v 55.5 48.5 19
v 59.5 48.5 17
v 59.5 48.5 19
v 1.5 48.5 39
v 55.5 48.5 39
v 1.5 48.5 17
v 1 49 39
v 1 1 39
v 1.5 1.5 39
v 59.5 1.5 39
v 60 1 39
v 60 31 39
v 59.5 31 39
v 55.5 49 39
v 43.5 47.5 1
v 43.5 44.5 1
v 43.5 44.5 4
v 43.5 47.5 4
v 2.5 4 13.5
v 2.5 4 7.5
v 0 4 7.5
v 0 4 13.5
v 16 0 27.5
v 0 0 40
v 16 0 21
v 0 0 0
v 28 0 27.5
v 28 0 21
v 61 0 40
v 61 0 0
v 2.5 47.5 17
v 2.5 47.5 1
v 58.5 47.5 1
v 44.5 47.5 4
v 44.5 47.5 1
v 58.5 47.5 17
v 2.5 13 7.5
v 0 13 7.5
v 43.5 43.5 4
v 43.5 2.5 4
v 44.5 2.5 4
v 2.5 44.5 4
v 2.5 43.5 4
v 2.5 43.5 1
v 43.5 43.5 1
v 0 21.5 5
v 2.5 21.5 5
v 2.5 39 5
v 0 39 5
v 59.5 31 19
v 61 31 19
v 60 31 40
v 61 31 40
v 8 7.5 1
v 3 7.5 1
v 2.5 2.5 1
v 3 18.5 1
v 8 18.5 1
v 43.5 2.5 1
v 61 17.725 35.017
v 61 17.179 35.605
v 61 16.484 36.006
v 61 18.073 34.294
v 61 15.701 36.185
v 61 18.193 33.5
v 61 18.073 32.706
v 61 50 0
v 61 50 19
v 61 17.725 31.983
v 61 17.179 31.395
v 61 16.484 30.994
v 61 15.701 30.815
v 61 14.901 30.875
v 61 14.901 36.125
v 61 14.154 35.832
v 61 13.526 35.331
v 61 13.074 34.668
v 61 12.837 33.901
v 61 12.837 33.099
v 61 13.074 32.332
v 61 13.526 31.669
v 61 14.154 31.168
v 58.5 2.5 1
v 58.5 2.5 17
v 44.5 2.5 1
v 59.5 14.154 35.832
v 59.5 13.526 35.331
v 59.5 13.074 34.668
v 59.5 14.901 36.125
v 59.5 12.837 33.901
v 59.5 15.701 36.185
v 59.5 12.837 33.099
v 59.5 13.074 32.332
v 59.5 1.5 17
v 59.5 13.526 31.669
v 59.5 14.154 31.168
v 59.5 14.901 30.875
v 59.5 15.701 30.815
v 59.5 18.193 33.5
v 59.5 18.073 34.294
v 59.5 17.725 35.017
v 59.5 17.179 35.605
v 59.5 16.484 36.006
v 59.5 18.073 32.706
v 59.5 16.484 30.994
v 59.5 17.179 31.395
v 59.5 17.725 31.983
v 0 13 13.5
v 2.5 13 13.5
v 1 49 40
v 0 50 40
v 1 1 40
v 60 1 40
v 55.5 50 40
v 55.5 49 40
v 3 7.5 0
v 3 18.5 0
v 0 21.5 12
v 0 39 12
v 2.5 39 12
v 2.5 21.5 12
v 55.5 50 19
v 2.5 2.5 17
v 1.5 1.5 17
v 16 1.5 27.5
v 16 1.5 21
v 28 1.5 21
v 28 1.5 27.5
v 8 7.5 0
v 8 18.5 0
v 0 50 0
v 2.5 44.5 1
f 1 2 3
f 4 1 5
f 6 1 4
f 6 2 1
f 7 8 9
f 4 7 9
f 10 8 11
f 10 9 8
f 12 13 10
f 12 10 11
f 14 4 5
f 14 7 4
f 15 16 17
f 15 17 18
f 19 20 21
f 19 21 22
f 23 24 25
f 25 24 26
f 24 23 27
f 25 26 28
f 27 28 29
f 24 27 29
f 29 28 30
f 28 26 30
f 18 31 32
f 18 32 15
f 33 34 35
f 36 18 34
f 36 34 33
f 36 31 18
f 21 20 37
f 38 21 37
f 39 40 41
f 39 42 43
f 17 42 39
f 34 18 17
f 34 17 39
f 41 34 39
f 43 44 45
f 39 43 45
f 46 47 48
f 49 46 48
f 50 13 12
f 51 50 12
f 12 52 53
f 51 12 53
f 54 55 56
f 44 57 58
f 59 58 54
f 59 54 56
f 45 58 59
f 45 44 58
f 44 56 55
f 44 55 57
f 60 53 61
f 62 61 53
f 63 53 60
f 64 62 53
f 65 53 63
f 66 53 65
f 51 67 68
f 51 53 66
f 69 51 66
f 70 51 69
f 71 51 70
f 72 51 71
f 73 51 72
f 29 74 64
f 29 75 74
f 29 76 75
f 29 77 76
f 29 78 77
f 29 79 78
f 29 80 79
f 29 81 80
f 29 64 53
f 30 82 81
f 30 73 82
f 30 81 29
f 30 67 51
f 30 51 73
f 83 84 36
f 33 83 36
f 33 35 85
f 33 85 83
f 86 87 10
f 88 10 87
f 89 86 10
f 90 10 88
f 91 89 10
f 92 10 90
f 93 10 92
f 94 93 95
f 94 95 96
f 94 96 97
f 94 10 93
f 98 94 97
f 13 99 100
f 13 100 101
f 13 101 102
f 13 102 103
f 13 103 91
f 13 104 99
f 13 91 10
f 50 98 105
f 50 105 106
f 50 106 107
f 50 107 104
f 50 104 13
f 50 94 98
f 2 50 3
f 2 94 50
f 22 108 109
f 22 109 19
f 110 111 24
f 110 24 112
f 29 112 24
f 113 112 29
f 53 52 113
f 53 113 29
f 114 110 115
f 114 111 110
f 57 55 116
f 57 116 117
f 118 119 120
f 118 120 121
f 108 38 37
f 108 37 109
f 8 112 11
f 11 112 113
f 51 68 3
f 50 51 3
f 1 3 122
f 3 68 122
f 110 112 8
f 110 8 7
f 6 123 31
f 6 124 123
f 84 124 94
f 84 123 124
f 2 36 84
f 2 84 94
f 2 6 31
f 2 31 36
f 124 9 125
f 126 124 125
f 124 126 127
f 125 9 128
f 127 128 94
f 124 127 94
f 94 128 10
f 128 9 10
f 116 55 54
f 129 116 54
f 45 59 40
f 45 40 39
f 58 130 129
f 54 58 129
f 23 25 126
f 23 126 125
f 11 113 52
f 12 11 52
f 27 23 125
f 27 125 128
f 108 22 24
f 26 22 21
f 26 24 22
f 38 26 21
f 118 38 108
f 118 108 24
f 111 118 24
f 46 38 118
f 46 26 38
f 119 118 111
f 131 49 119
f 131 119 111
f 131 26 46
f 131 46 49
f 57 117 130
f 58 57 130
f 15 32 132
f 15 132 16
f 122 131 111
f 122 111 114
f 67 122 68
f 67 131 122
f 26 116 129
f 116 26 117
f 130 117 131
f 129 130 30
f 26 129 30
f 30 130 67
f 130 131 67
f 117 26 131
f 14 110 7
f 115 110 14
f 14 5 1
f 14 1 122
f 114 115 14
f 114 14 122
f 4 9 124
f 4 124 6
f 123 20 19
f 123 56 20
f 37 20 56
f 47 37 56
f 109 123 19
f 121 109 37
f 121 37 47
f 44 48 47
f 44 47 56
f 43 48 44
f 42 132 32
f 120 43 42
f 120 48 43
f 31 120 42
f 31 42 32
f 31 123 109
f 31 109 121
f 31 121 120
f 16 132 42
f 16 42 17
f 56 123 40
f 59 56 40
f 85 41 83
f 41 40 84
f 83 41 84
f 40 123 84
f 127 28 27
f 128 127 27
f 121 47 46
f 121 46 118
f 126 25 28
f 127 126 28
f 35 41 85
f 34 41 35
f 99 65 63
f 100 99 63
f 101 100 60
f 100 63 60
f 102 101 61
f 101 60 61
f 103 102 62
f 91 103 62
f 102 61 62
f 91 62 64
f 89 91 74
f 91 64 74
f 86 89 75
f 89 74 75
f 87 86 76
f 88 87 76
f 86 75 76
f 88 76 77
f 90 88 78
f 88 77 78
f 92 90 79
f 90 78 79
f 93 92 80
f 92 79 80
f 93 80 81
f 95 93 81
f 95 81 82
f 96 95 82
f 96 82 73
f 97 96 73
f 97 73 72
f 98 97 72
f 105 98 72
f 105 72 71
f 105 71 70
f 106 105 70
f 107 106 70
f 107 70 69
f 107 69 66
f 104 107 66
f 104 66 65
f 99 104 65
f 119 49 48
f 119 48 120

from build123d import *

# Parameters (mm, degrees)
SKETCH_W        = 61
SKETCH_H        = 50
PAD_DEPTH       = 40
SKETCH001_W     = 58
SKETCH001_H     = 47
POCKET_DEPTH    = 23
SKETCH002_W     = 56
SKETCH002_H     = 45
POCKET001_DEPTH = 16
SKETCH003_W     = 1
SKETCH003_H     = 45
PAD001_DEPTH    = 3
SKETCH004_W     = 4
SKETCH004_H     = 11
POCKET002_DEPTH = 5
SKETCH005_W     = 5.5
SKETCH005_H     = 15.5
POCKET003_DEPTH = 23
SKETCH006_W     = 59
SKETCH006_H     = 48
POCKET004_DEPTH = 1
SKETCH007_W     = 2.5
SKETCH007_H     = 3.5
POCKET005_DEPTH = 23
SKETCH009_W     = 10
SKETCH009_H     = 5
POCKET006_DEPTH = 5
PAD002_DEPTH    = 2
SKETCH011_W     = 8
SKETCH011_H     = 4.5
POCKET007_DEPTH = 5
SKETCH012_W     = 15.5
SKETCH012_H     = 6
POCKET008_DEPTH = 5
SKETCH013_W     = 9
SKETCH013_H     = 1
POCKET009_DEPTH = 3
SKETCH014_W     = 1
SKETCH014_H     = 4.5
POCKET010_DEPTH = 5
SKETCH015_W     = 9
SKETCH015_H     = 0.5
POCKET011_DEPTH = 5
SKETCH016_W     = 17.5
SKETCH016_H     = 1
POCKET012_DEPTH = 5
SKETCH017_W     = 2
SKETCH017_H     = 6
POCKET013_DEPTH = 5
SKETCH018_W     = 1
SKETCH018_H     = 11
POCKET014_DEPTH = 5
SKETCH019_W     = 12
SKETCH019_H     = 1.5
POCKET015_DEPTH = 5
SKETCH020_W     = 2
SKETCH020_H     = 5
POCKET016_DEPTH = 5
SKETCH021_R     = 2.692582
POCKET017_DEPTH = 5
SKETCH022_W     = 1
SKETCH022_H     = 45
PAD003_DEPTH    = 3
SKETCH023_W     = 41
SKETCH023_H     = 1
PAD004_DEPTH    = 3
SKETCH024_W     = 1
SKETCH024_H     = 45
POCKET018_DEPTH = 3


with BuildPart() as part:
    # Sketch → Pad (new body)
    with BuildSketch(Plane.XY):
        with Locations((30.5, 25)):
            Rectangle(SKETCH_W, SKETCH_H)
    extrude(amount=PAD_DEPTH)

    # Sketch001 (on Face6 of Pad) → Pocket (cut)
    with BuildSketch(Plane.XY.offset(40)):
        with Locations((30.5, 25)):
            Rectangle(SKETCH001_W, SKETCH001_H)
    extrude(amount=-POCKET_DEPTH, mode=Mode.SUBTRACT)

    # Sketch002 (on Face11 of Pocket) → Pocket001 (cut)
    with BuildSketch(Plane.XY.offset(17)):
        with Locations((30.5, 25)):
            Rectangle(SKETCH002_W, SKETCH002_H)
    extrude(amount=-POCKET001_DEPTH, mode=Mode.SUBTRACT)

    # Sketch003 (on Face16 of Pocket001) → Pad001 (join)
    with BuildSketch(Plane.XY.offset(1)):
        with Locations((45, 25)):
            Rectangle(SKETCH003_W, SKETCH003_H)
    extrude(amount=PAD001_DEPTH)

    # Sketch004 (on Face20 of Pad001) → Pocket002 (cut)
    with BuildSketch(Plane.XY.offset(1)):
        with Locations((5, 13)):
            Rectangle(SKETCH004_W, SKETCH004_H)
    extrude(amount=-POCKET002_DEPTH, mode=Mode.SUBTRACT)

    # Sketch005 (on Face5 of Pocket002) → Pocket003 (cut)
    with BuildSketch(Plane.XY.offset(40)):
        with Locations((58.25, 42.25)):
            Rectangle(SKETCH005_W, SKETCH005_H)
    extrude(amount=-POCKET003_DEPTH, mode=Mode.SUBTRACT)

    # Sketch006 (on Face5 of Pocket003) → Pocket004 (cut)
    with BuildSketch(Plane.XY.offset(40)):
        with Locations((30.5, 25)):
            Rectangle(SKETCH006_W, SKETCH006_H)
    extrude(amount=-POCKET004_DEPTH, mode=Mode.SUBTRACT)

    # Sketch007 (on Face5 of Pocket004) → Pocket005 (cut)
    with BuildSketch(Plane.XY.offset(40)):
        with Locations((59.75, 32.75)):
            Rectangle(SKETCH007_W, SKETCH007_H)
    extrude(amount=-POCKET005_DEPTH, mode=Mode.SUBTRACT)

    # Sketch009 (on Face1 of Pocket005) → Pocket006 (cut)
    with BuildSketch(Plane.XZ):
        with Locations((21, 23.5)):
            Rectangle(SKETCH009_W, SKETCH009_H)
    extrude(amount=-POCKET006_DEPTH, mode=Mode.SUBTRACT)

    # Sketch010 (on Face21 of Pocket006) → Pad002 (join)
    with BuildSketch(Plane.XY.offset(17)):
        Polygon((55.5, 50), (61, 50), (61, 31), (59.5, 31), (59.5, 48.5), (55.5, 48.5), align=None)
    extrude(amount=PAD002_DEPTH)

    # Sketch011 (on Face31 of Pad002) → Pocket007 (cut)
    with BuildSketch(Plane.YZ.offset(2.5)):
        with Locations((8, 9.75)):
            Rectangle(SKETCH011_W, SKETCH011_H)
    extrude(amount=-POCKET007_DEPTH, mode=Mode.SUBTRACT)

    # Sketch012 (on Face28 of Pocket007) → Pocket008 (cut)
    with BuildSketch(Plane.YZ.offset(2.5)):
        with Locations((29.25, 8)):
            Rectangle(SKETCH012_W, SKETCH012_H)
    extrude(amount=-POCKET008_DEPTH, mode=Mode.SUBTRACT)

    # Sketch013 (on Face2 of Pocket008) → Pocket009 (cut)
    with BuildSketch(Plane(origin=(0, 0, 0), x_dir=(0, -1, 0), z_dir=(-1, 0, 0))):
        with Locations((-8.5, 12.5)):
            Rectangle(SKETCH013_W, SKETCH013_H)
    extrude(amount=-POCKET009_DEPTH, mode=Mode.SUBTRACT)

    # Sketch014 (on Face2 of Pocket009) → Pocket010 (cut)
    with BuildSketch(Plane(origin=(0, 0, 0), x_dir=(0, -1, 0), z_dir=(-1, 0, 0))):
        with Locations((-12.5, 9.75)):
            Rectangle(SKETCH014_W, SKETCH014_H)
    extrude(amount=-POCKET010_DEPTH, mode=Mode.SUBTRACT)

    # Sketch015 (on Face2 of Pocket010) → Pocket011 (cut)
    with BuildSketch(Plane(origin=(0, 0, 0), x_dir=(0, -1, 0), z_dir=(-1, 0, 0))):
        with Locations((-8.5, 13.25)):
            Rectangle(SKETCH015_W, SKETCH015_H)
    extrude(amount=-POCKET011_DEPTH, mode=Mode.SUBTRACT)

    # Sketch016 (on Face2 of Pocket011) → Pocket012 (cut)
    with BuildSketch(Plane(origin=(0, 0, 0), x_dir=(0, -1, 0), z_dir=(-1, 0, 0))):
        with Locations((-30.25, 11.5)):
            Rectangle(SKETCH016_W, SKETCH016_H)
    extrude(amount=-POCKET012_DEPTH, mode=Mode.SUBTRACT)

    # Sketch017 (on Face2 of Pocket012) → Pocket013 (cut)
    with BuildSketch(Plane(origin=(0, 0, 0), x_dir=(0, -1, 0), z_dir=(-1, 0, 0))):
        with Locations((-38, 8)):
            Rectangle(SKETCH017_W, SKETCH017_H)
    extrude(amount=-POCKET013_DEPTH, mode=Mode.SUBTRACT)

    # Sketch018 (on Face3 of Pocket013) → Pocket014 (cut)
    with BuildSketch(Plane(origin=(0, 0, 0), x_dir=(1, 0, 0), z_dir=(0, 0, -1))):
        with Locations((7.5, -13)):
            Rectangle(SKETCH018_W, SKETCH018_H)
    extrude(amount=-POCKET014_DEPTH, mode=Mode.SUBTRACT)

    # Sketch019 (on Face1 of Pocket014) → Pocket015 (cut)
    with BuildSketch(Plane.XZ):
        with Locations((22, 26.75)):
            Rectangle(SKETCH019_W, SKETCH019_H)
    extrude(amount=-POCKET015_DEPTH, mode=Mode.SUBTRACT)

    # Sketch020 (on Face1 of Pocket015) → Pocket016 (cut)
    with BuildSketch(Plane.XZ):
        with Locations((27, 23.5)):
            Rectangle(SKETCH020_W, SKETCH020_H)
    extrude(amount=-POCKET016_DEPTH, mode=Mode.SUBTRACT)

    # Sketch021 (on Face5 of Pocket016) → Pocket017 (cut)
    with BuildSketch(Plane.YZ.offset(61)):
        with Locations((15.5, 33.5)):
            Circle(SKETCH021_R)
    extrude(amount=-POCKET017_DEPTH, mode=Mode.SUBTRACT)

    # Sketch022 (on Face47 of Pocket017) → Pad003 (join)
    with BuildSketch(Plane.XY.offset(1)):
        with Locations((44, 25)):
            Rectangle(SKETCH022_W, SKETCH022_H)
    extrude(amount=PAD003_DEPTH)

    # Sketch023 (on Face47 of Pad003) → Pad004 (join)
    with BuildSketch(Plane.XY.offset(1)):
        with Locations((23, 44)):
            Rectangle(SKETCH023_W, SKETCH023_H)
    extrude(amount=PAD004_DEPTH)

    # Sketch024 (on Face68 of Pad004) → Pocket018 (cut)
    with BuildSketch(Plane.XY.offset(4)):
        with Locations((45, 25)):
            Rectangle(SKETCH024_W, SKETCH024_H)
    extrude(amount=-POCKET018_DEPTH, mode=Mode.SUBTRACT)


solid = part.part
